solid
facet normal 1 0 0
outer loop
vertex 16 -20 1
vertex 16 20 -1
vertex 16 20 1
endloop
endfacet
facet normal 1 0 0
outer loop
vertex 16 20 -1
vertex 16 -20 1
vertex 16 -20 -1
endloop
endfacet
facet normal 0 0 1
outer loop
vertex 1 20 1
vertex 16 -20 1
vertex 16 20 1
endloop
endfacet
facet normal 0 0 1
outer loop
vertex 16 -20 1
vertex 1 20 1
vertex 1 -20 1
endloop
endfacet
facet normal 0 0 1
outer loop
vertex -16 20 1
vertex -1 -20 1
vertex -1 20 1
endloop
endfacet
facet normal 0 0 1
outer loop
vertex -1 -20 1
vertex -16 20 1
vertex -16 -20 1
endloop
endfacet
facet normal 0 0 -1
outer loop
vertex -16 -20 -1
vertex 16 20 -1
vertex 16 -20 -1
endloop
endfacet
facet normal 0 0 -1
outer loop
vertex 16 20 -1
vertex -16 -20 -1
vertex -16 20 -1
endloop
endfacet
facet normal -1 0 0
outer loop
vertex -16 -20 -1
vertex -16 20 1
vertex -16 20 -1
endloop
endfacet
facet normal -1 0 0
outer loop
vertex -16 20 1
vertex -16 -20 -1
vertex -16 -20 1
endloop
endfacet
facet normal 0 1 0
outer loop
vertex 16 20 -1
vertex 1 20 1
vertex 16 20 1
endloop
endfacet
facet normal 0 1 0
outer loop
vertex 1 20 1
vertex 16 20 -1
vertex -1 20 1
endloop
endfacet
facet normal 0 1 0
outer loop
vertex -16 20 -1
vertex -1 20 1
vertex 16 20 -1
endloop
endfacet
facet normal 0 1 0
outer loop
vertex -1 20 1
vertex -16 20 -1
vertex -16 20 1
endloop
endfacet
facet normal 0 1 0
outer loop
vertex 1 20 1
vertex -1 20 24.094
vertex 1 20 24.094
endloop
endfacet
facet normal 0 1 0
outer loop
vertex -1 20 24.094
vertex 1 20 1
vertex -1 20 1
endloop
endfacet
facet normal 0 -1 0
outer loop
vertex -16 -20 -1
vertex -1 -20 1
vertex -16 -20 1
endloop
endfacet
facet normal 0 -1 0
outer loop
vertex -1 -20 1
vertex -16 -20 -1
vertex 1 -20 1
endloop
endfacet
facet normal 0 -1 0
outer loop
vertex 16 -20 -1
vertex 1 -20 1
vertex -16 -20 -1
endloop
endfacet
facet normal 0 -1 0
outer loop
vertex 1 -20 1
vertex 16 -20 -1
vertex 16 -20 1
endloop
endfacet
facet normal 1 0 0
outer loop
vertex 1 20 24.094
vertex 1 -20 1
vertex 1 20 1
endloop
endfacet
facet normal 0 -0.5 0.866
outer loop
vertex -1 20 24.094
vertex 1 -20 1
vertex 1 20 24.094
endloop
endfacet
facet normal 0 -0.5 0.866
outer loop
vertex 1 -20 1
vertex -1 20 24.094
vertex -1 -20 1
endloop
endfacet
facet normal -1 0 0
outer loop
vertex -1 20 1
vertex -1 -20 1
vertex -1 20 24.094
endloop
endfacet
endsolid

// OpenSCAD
// Razor holder: angle

thick = 2;       // thickness of material
length = 40;     // length of the whole angle
base = 30+thick; // width of the base
height = length*tan(30); // height of the angle (without base)

angle();

module angle() {
  union() {
    base();
    color("Red") translate([0,0,thick/2])
      wedge();
  }
}

module wedge() {
  rotate([0,-90,0])
    linear_extrude(height=thick,center=true)
    polygon([[0,-length/2],[0,length/2],[height,length/2]]);
}

module base() {
  cube([base,length,thick],center=true);
}
